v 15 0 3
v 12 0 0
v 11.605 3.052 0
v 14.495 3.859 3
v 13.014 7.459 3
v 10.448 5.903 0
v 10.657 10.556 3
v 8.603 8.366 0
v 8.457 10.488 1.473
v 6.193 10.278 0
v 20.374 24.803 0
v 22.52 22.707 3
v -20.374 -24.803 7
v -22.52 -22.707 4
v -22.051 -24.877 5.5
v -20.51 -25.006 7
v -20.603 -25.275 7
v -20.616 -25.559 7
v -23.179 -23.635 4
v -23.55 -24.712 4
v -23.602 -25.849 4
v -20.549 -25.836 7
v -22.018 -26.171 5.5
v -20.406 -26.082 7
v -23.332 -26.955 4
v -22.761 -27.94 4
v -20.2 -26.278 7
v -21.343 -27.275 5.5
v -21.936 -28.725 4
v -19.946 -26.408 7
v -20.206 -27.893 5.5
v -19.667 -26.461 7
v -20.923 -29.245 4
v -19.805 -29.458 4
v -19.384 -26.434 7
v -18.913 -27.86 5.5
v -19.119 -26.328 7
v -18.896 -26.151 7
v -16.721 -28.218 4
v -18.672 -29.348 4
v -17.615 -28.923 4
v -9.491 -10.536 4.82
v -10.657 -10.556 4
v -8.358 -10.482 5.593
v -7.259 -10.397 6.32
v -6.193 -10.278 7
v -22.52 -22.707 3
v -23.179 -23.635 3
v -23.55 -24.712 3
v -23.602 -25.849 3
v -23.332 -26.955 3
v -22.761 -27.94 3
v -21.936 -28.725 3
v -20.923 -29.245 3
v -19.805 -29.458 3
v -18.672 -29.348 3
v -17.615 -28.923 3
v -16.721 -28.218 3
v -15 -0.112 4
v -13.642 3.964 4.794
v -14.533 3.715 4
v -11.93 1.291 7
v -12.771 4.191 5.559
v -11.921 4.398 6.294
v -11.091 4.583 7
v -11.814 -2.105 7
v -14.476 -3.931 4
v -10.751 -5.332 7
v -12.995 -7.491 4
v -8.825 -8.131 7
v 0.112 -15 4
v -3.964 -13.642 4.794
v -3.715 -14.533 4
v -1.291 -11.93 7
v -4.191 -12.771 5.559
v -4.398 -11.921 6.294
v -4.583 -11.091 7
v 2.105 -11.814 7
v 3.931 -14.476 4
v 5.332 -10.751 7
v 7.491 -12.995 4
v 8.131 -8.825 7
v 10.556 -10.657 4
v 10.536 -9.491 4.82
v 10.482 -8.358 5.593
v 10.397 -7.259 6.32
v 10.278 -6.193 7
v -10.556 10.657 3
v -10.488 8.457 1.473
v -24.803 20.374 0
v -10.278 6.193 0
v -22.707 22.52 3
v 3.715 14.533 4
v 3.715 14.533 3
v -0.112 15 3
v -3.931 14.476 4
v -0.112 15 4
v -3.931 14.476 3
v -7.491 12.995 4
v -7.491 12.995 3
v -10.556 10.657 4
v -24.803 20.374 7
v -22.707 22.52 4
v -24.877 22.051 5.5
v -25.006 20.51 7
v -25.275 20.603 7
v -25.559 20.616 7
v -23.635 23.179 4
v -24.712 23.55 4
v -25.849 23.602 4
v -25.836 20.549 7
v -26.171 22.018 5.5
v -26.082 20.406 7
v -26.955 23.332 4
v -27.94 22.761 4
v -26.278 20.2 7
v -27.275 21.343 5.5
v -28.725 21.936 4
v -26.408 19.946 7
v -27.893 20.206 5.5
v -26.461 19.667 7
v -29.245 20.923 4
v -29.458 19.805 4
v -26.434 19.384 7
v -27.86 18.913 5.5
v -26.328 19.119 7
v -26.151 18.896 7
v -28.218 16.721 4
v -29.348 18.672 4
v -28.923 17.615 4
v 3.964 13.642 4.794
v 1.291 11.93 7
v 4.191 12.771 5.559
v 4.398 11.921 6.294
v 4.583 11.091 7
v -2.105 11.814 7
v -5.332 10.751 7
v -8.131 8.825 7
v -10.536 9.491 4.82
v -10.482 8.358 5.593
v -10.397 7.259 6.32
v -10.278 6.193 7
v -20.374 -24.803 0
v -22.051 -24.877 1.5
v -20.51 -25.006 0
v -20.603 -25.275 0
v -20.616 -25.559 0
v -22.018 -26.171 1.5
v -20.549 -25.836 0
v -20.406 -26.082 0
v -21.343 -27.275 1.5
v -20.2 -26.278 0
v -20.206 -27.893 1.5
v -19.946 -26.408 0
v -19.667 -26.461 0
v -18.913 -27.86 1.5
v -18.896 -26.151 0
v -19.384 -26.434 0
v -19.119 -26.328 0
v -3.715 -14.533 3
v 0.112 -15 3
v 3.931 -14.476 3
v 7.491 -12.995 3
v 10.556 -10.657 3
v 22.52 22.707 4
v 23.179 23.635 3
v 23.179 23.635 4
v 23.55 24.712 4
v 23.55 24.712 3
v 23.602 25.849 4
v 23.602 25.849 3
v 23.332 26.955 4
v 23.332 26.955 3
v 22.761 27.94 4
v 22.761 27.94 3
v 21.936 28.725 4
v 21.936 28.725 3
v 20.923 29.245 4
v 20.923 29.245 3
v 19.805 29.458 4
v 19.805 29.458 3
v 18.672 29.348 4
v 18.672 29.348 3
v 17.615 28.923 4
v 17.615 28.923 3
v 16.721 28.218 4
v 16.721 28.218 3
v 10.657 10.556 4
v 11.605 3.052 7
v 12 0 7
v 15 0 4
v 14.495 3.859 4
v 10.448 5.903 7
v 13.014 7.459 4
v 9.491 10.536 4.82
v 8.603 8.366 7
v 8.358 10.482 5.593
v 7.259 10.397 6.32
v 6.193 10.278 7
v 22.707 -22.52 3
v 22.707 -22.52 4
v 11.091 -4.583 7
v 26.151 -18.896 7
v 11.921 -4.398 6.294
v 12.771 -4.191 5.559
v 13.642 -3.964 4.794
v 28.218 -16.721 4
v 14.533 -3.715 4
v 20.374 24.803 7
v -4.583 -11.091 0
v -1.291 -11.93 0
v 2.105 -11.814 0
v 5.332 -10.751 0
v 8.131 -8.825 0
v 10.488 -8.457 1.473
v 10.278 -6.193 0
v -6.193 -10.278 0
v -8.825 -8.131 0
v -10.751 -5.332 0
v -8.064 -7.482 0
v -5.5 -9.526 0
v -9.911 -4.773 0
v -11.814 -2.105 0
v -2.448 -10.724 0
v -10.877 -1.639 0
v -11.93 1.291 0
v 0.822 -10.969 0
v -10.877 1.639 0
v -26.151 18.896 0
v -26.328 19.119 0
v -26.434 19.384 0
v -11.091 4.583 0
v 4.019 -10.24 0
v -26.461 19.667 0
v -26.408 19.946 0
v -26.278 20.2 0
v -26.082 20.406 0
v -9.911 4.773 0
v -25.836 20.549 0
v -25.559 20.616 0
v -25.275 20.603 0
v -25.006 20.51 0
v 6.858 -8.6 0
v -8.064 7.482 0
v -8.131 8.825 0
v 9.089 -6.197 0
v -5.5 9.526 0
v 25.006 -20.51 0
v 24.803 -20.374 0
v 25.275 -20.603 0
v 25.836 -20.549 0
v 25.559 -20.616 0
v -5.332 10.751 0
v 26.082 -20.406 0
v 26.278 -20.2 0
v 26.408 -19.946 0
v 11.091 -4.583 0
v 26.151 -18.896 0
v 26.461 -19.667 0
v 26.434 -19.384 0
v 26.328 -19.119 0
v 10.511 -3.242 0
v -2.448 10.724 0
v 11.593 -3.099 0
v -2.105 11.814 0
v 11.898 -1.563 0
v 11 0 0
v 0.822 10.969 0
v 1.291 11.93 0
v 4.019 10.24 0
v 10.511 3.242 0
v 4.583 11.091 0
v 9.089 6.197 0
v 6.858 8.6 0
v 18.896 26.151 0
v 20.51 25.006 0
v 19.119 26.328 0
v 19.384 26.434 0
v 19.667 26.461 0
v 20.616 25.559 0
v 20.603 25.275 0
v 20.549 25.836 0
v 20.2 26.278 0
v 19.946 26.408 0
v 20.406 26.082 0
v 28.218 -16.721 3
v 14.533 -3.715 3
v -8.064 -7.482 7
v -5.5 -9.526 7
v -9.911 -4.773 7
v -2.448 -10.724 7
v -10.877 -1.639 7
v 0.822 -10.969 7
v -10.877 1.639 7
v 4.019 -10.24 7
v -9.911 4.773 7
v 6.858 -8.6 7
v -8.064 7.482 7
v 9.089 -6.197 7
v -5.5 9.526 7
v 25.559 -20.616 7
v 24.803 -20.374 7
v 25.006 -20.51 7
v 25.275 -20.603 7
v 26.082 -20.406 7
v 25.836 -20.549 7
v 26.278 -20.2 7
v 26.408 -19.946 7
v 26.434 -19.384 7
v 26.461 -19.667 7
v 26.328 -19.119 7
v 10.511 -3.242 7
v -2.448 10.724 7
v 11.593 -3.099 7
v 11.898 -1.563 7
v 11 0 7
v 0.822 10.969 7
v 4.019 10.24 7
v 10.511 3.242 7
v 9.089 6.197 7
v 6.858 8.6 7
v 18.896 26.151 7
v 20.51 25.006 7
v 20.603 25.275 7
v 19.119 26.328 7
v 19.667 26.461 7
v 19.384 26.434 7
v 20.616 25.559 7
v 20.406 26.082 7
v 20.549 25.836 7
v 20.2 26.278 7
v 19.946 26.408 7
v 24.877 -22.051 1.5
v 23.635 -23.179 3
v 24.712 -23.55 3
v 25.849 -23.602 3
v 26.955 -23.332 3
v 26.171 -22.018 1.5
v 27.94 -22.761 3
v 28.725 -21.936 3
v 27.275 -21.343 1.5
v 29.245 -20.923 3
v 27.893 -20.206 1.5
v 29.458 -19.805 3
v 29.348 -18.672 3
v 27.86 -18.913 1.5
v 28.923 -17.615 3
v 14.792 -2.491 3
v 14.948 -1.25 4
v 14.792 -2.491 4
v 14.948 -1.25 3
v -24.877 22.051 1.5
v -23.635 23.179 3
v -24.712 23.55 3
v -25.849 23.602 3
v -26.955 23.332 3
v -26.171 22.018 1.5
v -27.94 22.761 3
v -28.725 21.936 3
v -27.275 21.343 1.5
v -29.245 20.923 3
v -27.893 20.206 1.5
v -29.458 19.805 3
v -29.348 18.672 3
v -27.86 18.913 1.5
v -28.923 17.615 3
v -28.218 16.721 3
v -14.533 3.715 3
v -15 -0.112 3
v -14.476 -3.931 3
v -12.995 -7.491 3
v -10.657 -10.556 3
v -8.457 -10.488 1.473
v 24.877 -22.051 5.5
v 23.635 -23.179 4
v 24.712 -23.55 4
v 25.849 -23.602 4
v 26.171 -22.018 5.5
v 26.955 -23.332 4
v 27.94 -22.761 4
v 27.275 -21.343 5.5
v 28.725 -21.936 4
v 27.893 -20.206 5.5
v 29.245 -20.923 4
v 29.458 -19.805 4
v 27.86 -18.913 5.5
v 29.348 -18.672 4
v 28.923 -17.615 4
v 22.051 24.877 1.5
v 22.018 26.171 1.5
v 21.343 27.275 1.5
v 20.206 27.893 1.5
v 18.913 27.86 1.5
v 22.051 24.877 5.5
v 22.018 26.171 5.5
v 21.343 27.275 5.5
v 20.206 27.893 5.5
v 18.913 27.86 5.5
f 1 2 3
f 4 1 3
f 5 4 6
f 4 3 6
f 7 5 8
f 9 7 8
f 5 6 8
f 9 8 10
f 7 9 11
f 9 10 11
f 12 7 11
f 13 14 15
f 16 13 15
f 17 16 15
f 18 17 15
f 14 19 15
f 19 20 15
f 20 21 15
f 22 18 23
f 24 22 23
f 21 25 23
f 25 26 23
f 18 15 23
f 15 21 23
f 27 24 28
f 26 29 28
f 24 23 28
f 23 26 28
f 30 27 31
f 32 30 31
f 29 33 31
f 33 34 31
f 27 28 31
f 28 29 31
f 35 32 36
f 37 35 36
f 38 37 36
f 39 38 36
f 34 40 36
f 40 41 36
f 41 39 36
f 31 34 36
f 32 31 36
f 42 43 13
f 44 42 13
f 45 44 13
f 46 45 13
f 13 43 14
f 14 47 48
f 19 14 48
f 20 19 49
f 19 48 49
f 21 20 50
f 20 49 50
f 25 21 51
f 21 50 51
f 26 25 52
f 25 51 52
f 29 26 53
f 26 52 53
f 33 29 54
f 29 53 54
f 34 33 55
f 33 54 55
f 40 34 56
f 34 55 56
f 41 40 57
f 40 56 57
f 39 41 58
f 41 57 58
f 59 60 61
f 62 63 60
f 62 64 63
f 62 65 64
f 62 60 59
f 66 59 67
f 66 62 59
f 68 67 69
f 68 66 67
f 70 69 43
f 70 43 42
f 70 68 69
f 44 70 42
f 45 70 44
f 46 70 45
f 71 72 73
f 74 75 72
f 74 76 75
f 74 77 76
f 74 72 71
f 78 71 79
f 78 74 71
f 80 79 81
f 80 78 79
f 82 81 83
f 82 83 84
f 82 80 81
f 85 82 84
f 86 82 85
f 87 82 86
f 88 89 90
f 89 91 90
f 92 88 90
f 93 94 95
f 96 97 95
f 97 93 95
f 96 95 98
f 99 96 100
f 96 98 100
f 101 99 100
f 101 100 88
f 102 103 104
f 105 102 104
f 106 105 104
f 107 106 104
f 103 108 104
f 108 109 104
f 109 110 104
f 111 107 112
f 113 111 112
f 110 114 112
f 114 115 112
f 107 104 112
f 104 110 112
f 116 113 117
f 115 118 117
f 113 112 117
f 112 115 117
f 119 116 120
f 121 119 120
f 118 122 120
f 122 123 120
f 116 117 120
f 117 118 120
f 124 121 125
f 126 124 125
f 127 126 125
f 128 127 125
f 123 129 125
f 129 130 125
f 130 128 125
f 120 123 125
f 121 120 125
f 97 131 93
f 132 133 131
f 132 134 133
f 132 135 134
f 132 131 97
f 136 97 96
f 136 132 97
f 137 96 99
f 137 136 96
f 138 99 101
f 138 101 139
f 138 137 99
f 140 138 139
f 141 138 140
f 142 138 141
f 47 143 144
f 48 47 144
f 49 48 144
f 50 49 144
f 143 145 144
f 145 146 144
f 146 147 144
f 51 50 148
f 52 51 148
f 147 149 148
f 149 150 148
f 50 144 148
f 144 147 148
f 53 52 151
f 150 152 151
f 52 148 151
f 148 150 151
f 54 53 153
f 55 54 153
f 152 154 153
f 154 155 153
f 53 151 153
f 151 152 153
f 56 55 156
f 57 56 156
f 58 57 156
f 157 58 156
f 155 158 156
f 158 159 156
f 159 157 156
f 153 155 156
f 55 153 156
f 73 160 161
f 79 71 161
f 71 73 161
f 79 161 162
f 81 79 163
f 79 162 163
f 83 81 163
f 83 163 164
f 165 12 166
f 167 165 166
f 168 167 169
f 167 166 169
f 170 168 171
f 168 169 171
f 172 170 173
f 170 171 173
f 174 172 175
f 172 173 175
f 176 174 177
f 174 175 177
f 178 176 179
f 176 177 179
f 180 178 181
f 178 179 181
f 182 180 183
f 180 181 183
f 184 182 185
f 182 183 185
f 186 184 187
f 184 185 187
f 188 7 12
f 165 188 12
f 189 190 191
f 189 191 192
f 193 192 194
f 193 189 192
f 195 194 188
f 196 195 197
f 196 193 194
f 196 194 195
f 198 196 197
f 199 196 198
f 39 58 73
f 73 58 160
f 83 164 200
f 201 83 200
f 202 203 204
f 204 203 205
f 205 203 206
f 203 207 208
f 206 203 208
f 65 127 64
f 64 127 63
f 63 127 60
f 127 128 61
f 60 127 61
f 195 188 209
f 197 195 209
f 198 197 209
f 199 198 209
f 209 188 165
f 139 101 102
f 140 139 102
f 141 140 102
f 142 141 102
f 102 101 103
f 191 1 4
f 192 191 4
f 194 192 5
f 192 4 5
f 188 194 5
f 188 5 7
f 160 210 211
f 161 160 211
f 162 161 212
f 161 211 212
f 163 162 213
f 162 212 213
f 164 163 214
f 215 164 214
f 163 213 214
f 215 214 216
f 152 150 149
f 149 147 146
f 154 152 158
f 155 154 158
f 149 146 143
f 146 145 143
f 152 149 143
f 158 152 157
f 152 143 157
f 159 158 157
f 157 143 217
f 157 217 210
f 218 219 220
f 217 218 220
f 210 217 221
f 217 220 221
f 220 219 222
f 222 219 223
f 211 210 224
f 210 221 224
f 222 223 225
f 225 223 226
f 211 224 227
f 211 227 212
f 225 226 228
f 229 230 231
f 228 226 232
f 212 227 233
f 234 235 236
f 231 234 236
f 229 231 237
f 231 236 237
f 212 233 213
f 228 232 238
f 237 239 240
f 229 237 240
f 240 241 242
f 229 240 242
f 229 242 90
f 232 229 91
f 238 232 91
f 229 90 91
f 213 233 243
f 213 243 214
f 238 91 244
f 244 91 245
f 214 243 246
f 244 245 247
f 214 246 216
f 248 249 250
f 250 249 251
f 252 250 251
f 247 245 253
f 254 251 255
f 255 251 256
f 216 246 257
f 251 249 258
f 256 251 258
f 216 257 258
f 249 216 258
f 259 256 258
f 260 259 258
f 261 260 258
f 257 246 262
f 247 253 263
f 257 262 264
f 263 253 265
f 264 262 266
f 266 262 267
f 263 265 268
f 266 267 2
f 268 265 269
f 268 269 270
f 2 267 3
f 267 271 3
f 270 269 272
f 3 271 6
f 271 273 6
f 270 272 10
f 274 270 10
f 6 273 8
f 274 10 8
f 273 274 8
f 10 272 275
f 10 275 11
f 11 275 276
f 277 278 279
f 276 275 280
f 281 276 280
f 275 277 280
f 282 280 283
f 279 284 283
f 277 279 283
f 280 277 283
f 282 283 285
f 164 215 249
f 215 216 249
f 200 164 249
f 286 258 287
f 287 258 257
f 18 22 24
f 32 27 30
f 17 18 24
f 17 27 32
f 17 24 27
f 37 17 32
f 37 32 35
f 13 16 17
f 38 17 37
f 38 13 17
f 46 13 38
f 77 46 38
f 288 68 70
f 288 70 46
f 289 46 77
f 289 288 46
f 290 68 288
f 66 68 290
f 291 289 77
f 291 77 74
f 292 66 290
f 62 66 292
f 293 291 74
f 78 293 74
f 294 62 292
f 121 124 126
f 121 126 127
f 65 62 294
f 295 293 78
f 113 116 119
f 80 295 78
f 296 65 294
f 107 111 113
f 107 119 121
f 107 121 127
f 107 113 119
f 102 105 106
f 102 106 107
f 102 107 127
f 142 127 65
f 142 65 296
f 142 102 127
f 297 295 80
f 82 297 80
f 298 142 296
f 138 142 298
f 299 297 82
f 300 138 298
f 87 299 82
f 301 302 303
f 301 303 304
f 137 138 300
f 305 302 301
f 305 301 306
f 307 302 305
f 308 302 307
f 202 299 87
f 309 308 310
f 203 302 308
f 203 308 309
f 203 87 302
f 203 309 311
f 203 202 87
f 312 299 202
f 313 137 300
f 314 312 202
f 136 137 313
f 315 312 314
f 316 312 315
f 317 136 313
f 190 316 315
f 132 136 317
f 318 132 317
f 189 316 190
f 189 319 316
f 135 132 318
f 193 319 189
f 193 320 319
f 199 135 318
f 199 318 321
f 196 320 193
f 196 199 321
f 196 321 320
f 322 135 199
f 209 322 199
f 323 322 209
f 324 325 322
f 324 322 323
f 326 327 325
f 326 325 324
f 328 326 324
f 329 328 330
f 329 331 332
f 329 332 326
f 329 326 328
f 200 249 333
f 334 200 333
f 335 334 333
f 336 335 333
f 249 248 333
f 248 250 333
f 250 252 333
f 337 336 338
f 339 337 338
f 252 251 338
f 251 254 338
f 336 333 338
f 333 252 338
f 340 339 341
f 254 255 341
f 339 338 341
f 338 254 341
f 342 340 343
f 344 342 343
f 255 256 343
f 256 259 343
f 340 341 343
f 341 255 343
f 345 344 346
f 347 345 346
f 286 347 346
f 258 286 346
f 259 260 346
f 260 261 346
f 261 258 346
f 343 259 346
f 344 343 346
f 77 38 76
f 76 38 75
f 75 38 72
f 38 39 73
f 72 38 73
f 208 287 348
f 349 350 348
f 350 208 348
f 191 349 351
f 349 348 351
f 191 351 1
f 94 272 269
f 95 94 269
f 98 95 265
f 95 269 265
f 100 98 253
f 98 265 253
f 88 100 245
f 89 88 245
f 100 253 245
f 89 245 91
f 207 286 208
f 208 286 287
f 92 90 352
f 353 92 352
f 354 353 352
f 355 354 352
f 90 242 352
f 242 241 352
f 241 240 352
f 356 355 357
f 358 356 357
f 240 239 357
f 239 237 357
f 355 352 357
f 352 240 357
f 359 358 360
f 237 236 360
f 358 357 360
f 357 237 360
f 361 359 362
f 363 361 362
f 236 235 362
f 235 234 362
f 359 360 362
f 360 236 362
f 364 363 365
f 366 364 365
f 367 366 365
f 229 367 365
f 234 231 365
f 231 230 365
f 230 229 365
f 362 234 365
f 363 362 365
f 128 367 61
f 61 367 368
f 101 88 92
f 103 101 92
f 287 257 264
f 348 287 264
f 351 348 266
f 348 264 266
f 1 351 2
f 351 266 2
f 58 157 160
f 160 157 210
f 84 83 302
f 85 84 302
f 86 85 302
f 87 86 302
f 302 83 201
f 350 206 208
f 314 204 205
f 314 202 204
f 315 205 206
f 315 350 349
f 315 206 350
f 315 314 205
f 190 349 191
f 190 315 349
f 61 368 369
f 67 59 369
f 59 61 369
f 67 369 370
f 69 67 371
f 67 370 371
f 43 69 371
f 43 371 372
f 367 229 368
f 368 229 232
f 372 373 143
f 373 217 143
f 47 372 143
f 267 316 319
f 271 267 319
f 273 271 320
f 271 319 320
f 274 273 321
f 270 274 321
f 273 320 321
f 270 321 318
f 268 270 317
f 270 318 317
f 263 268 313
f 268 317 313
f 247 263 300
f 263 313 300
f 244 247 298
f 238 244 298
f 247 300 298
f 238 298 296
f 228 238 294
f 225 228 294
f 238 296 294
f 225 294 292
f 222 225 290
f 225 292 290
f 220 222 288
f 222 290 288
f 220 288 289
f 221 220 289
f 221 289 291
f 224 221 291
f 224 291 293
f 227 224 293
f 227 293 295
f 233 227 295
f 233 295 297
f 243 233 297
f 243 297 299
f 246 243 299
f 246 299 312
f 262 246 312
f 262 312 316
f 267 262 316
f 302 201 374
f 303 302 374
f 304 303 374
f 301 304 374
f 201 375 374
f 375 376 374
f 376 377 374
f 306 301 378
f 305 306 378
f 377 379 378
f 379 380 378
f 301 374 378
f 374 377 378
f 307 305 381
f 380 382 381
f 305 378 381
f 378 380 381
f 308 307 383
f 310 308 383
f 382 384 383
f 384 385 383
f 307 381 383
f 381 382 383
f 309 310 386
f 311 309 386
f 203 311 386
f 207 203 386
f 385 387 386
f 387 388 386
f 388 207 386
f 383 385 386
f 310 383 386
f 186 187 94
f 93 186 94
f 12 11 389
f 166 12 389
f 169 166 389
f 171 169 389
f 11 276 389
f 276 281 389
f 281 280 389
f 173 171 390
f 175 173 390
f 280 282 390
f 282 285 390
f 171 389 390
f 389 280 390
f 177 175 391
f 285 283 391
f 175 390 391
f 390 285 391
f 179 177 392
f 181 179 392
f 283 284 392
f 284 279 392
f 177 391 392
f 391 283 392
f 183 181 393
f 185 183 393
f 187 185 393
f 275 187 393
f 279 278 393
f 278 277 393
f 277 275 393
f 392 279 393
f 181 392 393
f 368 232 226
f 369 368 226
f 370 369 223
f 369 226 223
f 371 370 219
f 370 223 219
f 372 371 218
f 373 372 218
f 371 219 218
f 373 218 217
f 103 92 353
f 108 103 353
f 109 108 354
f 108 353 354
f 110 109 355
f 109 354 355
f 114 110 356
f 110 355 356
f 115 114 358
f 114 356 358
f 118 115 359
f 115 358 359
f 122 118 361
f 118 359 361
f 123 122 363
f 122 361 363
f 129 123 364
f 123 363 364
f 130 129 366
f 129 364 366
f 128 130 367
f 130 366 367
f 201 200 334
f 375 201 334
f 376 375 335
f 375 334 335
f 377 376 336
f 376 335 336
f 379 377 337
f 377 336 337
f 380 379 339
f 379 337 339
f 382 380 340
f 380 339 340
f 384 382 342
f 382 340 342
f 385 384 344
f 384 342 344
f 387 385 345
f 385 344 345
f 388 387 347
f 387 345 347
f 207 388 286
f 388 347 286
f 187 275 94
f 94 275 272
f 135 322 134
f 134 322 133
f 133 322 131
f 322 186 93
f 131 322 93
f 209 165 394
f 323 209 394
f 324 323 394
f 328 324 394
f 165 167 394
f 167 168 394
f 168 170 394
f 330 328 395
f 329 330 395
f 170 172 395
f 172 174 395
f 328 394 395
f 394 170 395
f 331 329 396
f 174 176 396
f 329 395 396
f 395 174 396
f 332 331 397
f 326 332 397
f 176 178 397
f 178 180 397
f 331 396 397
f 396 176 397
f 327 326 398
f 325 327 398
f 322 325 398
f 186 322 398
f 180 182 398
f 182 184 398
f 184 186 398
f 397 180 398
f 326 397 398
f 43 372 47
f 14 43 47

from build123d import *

# Parameters (mm, degrees)
F1_DEPTH = 7
F2_R     = 11
F3_DEPTH = 25
F4_DEPTH = 7
F5_SIZE  = 3
F7_SIZE  = 2.99999


# Not quite as in the source:
# - a fillet or chamfer is up to 0.001 mm smaller than in the source, because OpenCascade refuses the exact size
# - a feature of the source that left no trace in its solid (it failed there, or was rolled back) is left out


with BuildPart() as f1:
    # F0 (on Top) → F1 (new body)
    with BuildSketch(Plane.XY):
        with BuildLine():
            ThreePointArc((-14.5326485793, 3.7151211652), (-13.0157052433, 7.4559651971), (-10.5561338075, 10.6568306282))
            Line((-10.5561338075, 10.6568306282), (-22.7068742866, 22.5203487058))
            ThreePointArc((-22.7068742866, 22.5203487058), (-28.3618988311, 22.3764827918), (-28.2180329171, 16.7214582473))
            Line((-28.2180329171, 16.7214582473), (-14.5326485793, 3.7151211652))
        make_face()
        with BuildLine():
            ThreePointArc((14.5326485793, -3.7151211652), (14.8827035294, -1.872200752), (15, 0))
            ThreePointArc((15, 0), (13.8717781741, 5.7073435404), (10.6568306282, 10.5561338075))
            ThreePointArc((10.6568306282, 10.5561338075), (7.4559651971, 13.0157052433), (3.7151211652, 14.5326485793))
            ThreePointArc((3.7151211652, 14.5326485793), (-3.9313298883, 14.4756569906), (-10.5561338075, 10.6568306282))
            ThreePointArc((-10.5561338075, 10.6568306282), (-13.0157052433, 7.4559651971), (-14.5326485793, 3.7151211652))
            ThreePointArc((-14.5326485793, 3.7151211652), (-14.4756569906, -3.9313298883), (-10.6568306282, -10.5561338075))
            ThreePointArc((-10.6568306282, -10.5561338075), (-7.4559651971, -13.0157052433), (-3.7151211652, -14.5326485793))
            ThreePointArc((-3.7151211652, -14.5326485793), (3.9313298883, -14.4756569906), (10.5561338075, -10.6568306282))
            ThreePointArc((10.5561338075, -10.6568306282), (13.0157052433, -7.4559651971), (14.5326485793, -3.7151211652))
        make_face()
        with BuildLine():
            ThreePointArc((3.7151211652, 14.5326485793), (7.4559651971, 13.0157052433), (10.6568306282, 10.5561338075))
            Line((10.6568306282, 10.5561338075), (22.5203487058, 22.7068742866))
            ThreePointArc((22.5203487058, 22.7068742866), (22.3764827918, 28.3618988311), (16.7214582473, 28.2180329171))
            Line((16.7214582473, 28.2180329171), (3.7151211652, 14.5326485793))
        make_face()
        with BuildLine():
            Line((-16.7214582473, -28.2180329171), (-3.7151211652, -14.5326485793))
            ThreePointArc((-3.7151211652, -14.5326485793), (-7.4559651971, -13.0157052433), (-10.6568306282, -10.5561338075))
            Line((-10.6568306282, -10.5561338075), (-22.5203487058, -22.7068742866))
            ThreePointArc((-22.5203487058, -22.7068742866), (-22.3764827918, -28.3618988311), (-16.7214582473, -28.2180329171))
        make_face()
    extrude(amount=F1_DEPTH)

    # F2 (on face) → F3 (cut)
    with BuildSketch(Plane.XY.offset(7)):
        Circle(F2_R)
    extrude(amount=-F3_DEPTH, mode=Mode.SUBTRACT)

    # F0 (on Top) → F4 (join)
    with BuildSketch(Plane.XY):
        with BuildLine():
            Line((28.2180329171, -16.7214582473), (14.5326485793, -3.7151211652))
            ThreePointArc((14.5326485793, -3.7151211652), (13.0157052433, -7.4559651971), (10.5561338075, -10.6568306282))
            Line((10.5561338075, -10.6568306282), (22.7068742866, -22.5203487058))
            ThreePointArc((22.7068742866, -22.5203487058), (28.3618988311, -22.3764827918), (28.2180329171, -16.7214582473))
        make_face()
    extrude(amount=F4_DEPTH)

    # F5
    f5_edges = [f1.edges().sort_by_distance(p)[0] for p in [
        (16.58859, 16.631504, 7),
        (-16.631504, 16.58859, 7),
        (-16.58859, -16.631504, 7),
        (16.631504, -16.58859, 7),
    ]]
    chamfer(f5_edges, length=F5_SIZE)

    # F7 (size 3 in the source; OpenCascade refuses exactly that, so slightly less here)
    f7_edges = [f1.edges().sort_by_distance(p)[0] for p in [
        (16.631504, -16.58859, 0),
        (3.93133, -14.475657, 0),
        (-10.21829, -21.375341, 0),
        (-16.58859, -16.631504, 0),
        (-14.475657, -3.93133, 0),
        (-21.375341, 10.21829, 0),
        (-16.631504, 16.58859, 0),
        (-28.361899, 22.376483, 0),
        (10.21829, 21.375341, 0),
        (16.58859, 16.631504, 0),
        (22.376483, 28.361899, 0),
        (28.361899, -22.376483, 0),
        (21.375341, -10.21829, 0),
        (-22.376483, -28.361899, 0),
        (-3.93133, 14.475657, 0),
        (14.475657, 3.93133, 0),
        (14.475657, 3.93133, 7),
        (3.93133, -14.475657, 7),
        (-14.475657, -3.93133, 7),
        (-3.93133, 14.475657, 7),
    ]]
    chamfer(f7_edges, length=F7_SIZE)


solid = f1.part
